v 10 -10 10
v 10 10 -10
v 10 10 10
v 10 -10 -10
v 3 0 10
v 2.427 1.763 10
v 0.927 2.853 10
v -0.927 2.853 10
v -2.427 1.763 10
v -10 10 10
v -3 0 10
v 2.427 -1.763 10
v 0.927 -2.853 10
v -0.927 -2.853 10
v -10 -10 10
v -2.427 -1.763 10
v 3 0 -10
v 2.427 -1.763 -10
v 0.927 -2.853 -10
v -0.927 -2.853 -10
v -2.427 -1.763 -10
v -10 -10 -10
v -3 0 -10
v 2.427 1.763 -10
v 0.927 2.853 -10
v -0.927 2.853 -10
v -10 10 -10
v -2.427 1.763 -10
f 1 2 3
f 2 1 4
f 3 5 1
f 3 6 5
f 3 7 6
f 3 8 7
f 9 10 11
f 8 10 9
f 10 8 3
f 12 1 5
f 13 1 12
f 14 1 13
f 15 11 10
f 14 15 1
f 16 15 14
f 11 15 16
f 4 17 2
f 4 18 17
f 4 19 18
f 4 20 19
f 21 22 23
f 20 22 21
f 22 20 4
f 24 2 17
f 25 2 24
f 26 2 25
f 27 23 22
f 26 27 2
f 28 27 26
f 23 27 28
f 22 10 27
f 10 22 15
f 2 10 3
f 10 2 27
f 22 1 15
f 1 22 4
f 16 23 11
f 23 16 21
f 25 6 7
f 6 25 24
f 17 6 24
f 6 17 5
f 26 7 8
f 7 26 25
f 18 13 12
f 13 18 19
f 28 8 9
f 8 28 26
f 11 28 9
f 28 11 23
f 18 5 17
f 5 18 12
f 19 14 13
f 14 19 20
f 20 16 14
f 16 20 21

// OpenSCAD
// 20mm cube with centered 6mm through-hole
difference() {
    cube(20, center = true);
    cylinder(h = 22, d = 6, center = true);
}
